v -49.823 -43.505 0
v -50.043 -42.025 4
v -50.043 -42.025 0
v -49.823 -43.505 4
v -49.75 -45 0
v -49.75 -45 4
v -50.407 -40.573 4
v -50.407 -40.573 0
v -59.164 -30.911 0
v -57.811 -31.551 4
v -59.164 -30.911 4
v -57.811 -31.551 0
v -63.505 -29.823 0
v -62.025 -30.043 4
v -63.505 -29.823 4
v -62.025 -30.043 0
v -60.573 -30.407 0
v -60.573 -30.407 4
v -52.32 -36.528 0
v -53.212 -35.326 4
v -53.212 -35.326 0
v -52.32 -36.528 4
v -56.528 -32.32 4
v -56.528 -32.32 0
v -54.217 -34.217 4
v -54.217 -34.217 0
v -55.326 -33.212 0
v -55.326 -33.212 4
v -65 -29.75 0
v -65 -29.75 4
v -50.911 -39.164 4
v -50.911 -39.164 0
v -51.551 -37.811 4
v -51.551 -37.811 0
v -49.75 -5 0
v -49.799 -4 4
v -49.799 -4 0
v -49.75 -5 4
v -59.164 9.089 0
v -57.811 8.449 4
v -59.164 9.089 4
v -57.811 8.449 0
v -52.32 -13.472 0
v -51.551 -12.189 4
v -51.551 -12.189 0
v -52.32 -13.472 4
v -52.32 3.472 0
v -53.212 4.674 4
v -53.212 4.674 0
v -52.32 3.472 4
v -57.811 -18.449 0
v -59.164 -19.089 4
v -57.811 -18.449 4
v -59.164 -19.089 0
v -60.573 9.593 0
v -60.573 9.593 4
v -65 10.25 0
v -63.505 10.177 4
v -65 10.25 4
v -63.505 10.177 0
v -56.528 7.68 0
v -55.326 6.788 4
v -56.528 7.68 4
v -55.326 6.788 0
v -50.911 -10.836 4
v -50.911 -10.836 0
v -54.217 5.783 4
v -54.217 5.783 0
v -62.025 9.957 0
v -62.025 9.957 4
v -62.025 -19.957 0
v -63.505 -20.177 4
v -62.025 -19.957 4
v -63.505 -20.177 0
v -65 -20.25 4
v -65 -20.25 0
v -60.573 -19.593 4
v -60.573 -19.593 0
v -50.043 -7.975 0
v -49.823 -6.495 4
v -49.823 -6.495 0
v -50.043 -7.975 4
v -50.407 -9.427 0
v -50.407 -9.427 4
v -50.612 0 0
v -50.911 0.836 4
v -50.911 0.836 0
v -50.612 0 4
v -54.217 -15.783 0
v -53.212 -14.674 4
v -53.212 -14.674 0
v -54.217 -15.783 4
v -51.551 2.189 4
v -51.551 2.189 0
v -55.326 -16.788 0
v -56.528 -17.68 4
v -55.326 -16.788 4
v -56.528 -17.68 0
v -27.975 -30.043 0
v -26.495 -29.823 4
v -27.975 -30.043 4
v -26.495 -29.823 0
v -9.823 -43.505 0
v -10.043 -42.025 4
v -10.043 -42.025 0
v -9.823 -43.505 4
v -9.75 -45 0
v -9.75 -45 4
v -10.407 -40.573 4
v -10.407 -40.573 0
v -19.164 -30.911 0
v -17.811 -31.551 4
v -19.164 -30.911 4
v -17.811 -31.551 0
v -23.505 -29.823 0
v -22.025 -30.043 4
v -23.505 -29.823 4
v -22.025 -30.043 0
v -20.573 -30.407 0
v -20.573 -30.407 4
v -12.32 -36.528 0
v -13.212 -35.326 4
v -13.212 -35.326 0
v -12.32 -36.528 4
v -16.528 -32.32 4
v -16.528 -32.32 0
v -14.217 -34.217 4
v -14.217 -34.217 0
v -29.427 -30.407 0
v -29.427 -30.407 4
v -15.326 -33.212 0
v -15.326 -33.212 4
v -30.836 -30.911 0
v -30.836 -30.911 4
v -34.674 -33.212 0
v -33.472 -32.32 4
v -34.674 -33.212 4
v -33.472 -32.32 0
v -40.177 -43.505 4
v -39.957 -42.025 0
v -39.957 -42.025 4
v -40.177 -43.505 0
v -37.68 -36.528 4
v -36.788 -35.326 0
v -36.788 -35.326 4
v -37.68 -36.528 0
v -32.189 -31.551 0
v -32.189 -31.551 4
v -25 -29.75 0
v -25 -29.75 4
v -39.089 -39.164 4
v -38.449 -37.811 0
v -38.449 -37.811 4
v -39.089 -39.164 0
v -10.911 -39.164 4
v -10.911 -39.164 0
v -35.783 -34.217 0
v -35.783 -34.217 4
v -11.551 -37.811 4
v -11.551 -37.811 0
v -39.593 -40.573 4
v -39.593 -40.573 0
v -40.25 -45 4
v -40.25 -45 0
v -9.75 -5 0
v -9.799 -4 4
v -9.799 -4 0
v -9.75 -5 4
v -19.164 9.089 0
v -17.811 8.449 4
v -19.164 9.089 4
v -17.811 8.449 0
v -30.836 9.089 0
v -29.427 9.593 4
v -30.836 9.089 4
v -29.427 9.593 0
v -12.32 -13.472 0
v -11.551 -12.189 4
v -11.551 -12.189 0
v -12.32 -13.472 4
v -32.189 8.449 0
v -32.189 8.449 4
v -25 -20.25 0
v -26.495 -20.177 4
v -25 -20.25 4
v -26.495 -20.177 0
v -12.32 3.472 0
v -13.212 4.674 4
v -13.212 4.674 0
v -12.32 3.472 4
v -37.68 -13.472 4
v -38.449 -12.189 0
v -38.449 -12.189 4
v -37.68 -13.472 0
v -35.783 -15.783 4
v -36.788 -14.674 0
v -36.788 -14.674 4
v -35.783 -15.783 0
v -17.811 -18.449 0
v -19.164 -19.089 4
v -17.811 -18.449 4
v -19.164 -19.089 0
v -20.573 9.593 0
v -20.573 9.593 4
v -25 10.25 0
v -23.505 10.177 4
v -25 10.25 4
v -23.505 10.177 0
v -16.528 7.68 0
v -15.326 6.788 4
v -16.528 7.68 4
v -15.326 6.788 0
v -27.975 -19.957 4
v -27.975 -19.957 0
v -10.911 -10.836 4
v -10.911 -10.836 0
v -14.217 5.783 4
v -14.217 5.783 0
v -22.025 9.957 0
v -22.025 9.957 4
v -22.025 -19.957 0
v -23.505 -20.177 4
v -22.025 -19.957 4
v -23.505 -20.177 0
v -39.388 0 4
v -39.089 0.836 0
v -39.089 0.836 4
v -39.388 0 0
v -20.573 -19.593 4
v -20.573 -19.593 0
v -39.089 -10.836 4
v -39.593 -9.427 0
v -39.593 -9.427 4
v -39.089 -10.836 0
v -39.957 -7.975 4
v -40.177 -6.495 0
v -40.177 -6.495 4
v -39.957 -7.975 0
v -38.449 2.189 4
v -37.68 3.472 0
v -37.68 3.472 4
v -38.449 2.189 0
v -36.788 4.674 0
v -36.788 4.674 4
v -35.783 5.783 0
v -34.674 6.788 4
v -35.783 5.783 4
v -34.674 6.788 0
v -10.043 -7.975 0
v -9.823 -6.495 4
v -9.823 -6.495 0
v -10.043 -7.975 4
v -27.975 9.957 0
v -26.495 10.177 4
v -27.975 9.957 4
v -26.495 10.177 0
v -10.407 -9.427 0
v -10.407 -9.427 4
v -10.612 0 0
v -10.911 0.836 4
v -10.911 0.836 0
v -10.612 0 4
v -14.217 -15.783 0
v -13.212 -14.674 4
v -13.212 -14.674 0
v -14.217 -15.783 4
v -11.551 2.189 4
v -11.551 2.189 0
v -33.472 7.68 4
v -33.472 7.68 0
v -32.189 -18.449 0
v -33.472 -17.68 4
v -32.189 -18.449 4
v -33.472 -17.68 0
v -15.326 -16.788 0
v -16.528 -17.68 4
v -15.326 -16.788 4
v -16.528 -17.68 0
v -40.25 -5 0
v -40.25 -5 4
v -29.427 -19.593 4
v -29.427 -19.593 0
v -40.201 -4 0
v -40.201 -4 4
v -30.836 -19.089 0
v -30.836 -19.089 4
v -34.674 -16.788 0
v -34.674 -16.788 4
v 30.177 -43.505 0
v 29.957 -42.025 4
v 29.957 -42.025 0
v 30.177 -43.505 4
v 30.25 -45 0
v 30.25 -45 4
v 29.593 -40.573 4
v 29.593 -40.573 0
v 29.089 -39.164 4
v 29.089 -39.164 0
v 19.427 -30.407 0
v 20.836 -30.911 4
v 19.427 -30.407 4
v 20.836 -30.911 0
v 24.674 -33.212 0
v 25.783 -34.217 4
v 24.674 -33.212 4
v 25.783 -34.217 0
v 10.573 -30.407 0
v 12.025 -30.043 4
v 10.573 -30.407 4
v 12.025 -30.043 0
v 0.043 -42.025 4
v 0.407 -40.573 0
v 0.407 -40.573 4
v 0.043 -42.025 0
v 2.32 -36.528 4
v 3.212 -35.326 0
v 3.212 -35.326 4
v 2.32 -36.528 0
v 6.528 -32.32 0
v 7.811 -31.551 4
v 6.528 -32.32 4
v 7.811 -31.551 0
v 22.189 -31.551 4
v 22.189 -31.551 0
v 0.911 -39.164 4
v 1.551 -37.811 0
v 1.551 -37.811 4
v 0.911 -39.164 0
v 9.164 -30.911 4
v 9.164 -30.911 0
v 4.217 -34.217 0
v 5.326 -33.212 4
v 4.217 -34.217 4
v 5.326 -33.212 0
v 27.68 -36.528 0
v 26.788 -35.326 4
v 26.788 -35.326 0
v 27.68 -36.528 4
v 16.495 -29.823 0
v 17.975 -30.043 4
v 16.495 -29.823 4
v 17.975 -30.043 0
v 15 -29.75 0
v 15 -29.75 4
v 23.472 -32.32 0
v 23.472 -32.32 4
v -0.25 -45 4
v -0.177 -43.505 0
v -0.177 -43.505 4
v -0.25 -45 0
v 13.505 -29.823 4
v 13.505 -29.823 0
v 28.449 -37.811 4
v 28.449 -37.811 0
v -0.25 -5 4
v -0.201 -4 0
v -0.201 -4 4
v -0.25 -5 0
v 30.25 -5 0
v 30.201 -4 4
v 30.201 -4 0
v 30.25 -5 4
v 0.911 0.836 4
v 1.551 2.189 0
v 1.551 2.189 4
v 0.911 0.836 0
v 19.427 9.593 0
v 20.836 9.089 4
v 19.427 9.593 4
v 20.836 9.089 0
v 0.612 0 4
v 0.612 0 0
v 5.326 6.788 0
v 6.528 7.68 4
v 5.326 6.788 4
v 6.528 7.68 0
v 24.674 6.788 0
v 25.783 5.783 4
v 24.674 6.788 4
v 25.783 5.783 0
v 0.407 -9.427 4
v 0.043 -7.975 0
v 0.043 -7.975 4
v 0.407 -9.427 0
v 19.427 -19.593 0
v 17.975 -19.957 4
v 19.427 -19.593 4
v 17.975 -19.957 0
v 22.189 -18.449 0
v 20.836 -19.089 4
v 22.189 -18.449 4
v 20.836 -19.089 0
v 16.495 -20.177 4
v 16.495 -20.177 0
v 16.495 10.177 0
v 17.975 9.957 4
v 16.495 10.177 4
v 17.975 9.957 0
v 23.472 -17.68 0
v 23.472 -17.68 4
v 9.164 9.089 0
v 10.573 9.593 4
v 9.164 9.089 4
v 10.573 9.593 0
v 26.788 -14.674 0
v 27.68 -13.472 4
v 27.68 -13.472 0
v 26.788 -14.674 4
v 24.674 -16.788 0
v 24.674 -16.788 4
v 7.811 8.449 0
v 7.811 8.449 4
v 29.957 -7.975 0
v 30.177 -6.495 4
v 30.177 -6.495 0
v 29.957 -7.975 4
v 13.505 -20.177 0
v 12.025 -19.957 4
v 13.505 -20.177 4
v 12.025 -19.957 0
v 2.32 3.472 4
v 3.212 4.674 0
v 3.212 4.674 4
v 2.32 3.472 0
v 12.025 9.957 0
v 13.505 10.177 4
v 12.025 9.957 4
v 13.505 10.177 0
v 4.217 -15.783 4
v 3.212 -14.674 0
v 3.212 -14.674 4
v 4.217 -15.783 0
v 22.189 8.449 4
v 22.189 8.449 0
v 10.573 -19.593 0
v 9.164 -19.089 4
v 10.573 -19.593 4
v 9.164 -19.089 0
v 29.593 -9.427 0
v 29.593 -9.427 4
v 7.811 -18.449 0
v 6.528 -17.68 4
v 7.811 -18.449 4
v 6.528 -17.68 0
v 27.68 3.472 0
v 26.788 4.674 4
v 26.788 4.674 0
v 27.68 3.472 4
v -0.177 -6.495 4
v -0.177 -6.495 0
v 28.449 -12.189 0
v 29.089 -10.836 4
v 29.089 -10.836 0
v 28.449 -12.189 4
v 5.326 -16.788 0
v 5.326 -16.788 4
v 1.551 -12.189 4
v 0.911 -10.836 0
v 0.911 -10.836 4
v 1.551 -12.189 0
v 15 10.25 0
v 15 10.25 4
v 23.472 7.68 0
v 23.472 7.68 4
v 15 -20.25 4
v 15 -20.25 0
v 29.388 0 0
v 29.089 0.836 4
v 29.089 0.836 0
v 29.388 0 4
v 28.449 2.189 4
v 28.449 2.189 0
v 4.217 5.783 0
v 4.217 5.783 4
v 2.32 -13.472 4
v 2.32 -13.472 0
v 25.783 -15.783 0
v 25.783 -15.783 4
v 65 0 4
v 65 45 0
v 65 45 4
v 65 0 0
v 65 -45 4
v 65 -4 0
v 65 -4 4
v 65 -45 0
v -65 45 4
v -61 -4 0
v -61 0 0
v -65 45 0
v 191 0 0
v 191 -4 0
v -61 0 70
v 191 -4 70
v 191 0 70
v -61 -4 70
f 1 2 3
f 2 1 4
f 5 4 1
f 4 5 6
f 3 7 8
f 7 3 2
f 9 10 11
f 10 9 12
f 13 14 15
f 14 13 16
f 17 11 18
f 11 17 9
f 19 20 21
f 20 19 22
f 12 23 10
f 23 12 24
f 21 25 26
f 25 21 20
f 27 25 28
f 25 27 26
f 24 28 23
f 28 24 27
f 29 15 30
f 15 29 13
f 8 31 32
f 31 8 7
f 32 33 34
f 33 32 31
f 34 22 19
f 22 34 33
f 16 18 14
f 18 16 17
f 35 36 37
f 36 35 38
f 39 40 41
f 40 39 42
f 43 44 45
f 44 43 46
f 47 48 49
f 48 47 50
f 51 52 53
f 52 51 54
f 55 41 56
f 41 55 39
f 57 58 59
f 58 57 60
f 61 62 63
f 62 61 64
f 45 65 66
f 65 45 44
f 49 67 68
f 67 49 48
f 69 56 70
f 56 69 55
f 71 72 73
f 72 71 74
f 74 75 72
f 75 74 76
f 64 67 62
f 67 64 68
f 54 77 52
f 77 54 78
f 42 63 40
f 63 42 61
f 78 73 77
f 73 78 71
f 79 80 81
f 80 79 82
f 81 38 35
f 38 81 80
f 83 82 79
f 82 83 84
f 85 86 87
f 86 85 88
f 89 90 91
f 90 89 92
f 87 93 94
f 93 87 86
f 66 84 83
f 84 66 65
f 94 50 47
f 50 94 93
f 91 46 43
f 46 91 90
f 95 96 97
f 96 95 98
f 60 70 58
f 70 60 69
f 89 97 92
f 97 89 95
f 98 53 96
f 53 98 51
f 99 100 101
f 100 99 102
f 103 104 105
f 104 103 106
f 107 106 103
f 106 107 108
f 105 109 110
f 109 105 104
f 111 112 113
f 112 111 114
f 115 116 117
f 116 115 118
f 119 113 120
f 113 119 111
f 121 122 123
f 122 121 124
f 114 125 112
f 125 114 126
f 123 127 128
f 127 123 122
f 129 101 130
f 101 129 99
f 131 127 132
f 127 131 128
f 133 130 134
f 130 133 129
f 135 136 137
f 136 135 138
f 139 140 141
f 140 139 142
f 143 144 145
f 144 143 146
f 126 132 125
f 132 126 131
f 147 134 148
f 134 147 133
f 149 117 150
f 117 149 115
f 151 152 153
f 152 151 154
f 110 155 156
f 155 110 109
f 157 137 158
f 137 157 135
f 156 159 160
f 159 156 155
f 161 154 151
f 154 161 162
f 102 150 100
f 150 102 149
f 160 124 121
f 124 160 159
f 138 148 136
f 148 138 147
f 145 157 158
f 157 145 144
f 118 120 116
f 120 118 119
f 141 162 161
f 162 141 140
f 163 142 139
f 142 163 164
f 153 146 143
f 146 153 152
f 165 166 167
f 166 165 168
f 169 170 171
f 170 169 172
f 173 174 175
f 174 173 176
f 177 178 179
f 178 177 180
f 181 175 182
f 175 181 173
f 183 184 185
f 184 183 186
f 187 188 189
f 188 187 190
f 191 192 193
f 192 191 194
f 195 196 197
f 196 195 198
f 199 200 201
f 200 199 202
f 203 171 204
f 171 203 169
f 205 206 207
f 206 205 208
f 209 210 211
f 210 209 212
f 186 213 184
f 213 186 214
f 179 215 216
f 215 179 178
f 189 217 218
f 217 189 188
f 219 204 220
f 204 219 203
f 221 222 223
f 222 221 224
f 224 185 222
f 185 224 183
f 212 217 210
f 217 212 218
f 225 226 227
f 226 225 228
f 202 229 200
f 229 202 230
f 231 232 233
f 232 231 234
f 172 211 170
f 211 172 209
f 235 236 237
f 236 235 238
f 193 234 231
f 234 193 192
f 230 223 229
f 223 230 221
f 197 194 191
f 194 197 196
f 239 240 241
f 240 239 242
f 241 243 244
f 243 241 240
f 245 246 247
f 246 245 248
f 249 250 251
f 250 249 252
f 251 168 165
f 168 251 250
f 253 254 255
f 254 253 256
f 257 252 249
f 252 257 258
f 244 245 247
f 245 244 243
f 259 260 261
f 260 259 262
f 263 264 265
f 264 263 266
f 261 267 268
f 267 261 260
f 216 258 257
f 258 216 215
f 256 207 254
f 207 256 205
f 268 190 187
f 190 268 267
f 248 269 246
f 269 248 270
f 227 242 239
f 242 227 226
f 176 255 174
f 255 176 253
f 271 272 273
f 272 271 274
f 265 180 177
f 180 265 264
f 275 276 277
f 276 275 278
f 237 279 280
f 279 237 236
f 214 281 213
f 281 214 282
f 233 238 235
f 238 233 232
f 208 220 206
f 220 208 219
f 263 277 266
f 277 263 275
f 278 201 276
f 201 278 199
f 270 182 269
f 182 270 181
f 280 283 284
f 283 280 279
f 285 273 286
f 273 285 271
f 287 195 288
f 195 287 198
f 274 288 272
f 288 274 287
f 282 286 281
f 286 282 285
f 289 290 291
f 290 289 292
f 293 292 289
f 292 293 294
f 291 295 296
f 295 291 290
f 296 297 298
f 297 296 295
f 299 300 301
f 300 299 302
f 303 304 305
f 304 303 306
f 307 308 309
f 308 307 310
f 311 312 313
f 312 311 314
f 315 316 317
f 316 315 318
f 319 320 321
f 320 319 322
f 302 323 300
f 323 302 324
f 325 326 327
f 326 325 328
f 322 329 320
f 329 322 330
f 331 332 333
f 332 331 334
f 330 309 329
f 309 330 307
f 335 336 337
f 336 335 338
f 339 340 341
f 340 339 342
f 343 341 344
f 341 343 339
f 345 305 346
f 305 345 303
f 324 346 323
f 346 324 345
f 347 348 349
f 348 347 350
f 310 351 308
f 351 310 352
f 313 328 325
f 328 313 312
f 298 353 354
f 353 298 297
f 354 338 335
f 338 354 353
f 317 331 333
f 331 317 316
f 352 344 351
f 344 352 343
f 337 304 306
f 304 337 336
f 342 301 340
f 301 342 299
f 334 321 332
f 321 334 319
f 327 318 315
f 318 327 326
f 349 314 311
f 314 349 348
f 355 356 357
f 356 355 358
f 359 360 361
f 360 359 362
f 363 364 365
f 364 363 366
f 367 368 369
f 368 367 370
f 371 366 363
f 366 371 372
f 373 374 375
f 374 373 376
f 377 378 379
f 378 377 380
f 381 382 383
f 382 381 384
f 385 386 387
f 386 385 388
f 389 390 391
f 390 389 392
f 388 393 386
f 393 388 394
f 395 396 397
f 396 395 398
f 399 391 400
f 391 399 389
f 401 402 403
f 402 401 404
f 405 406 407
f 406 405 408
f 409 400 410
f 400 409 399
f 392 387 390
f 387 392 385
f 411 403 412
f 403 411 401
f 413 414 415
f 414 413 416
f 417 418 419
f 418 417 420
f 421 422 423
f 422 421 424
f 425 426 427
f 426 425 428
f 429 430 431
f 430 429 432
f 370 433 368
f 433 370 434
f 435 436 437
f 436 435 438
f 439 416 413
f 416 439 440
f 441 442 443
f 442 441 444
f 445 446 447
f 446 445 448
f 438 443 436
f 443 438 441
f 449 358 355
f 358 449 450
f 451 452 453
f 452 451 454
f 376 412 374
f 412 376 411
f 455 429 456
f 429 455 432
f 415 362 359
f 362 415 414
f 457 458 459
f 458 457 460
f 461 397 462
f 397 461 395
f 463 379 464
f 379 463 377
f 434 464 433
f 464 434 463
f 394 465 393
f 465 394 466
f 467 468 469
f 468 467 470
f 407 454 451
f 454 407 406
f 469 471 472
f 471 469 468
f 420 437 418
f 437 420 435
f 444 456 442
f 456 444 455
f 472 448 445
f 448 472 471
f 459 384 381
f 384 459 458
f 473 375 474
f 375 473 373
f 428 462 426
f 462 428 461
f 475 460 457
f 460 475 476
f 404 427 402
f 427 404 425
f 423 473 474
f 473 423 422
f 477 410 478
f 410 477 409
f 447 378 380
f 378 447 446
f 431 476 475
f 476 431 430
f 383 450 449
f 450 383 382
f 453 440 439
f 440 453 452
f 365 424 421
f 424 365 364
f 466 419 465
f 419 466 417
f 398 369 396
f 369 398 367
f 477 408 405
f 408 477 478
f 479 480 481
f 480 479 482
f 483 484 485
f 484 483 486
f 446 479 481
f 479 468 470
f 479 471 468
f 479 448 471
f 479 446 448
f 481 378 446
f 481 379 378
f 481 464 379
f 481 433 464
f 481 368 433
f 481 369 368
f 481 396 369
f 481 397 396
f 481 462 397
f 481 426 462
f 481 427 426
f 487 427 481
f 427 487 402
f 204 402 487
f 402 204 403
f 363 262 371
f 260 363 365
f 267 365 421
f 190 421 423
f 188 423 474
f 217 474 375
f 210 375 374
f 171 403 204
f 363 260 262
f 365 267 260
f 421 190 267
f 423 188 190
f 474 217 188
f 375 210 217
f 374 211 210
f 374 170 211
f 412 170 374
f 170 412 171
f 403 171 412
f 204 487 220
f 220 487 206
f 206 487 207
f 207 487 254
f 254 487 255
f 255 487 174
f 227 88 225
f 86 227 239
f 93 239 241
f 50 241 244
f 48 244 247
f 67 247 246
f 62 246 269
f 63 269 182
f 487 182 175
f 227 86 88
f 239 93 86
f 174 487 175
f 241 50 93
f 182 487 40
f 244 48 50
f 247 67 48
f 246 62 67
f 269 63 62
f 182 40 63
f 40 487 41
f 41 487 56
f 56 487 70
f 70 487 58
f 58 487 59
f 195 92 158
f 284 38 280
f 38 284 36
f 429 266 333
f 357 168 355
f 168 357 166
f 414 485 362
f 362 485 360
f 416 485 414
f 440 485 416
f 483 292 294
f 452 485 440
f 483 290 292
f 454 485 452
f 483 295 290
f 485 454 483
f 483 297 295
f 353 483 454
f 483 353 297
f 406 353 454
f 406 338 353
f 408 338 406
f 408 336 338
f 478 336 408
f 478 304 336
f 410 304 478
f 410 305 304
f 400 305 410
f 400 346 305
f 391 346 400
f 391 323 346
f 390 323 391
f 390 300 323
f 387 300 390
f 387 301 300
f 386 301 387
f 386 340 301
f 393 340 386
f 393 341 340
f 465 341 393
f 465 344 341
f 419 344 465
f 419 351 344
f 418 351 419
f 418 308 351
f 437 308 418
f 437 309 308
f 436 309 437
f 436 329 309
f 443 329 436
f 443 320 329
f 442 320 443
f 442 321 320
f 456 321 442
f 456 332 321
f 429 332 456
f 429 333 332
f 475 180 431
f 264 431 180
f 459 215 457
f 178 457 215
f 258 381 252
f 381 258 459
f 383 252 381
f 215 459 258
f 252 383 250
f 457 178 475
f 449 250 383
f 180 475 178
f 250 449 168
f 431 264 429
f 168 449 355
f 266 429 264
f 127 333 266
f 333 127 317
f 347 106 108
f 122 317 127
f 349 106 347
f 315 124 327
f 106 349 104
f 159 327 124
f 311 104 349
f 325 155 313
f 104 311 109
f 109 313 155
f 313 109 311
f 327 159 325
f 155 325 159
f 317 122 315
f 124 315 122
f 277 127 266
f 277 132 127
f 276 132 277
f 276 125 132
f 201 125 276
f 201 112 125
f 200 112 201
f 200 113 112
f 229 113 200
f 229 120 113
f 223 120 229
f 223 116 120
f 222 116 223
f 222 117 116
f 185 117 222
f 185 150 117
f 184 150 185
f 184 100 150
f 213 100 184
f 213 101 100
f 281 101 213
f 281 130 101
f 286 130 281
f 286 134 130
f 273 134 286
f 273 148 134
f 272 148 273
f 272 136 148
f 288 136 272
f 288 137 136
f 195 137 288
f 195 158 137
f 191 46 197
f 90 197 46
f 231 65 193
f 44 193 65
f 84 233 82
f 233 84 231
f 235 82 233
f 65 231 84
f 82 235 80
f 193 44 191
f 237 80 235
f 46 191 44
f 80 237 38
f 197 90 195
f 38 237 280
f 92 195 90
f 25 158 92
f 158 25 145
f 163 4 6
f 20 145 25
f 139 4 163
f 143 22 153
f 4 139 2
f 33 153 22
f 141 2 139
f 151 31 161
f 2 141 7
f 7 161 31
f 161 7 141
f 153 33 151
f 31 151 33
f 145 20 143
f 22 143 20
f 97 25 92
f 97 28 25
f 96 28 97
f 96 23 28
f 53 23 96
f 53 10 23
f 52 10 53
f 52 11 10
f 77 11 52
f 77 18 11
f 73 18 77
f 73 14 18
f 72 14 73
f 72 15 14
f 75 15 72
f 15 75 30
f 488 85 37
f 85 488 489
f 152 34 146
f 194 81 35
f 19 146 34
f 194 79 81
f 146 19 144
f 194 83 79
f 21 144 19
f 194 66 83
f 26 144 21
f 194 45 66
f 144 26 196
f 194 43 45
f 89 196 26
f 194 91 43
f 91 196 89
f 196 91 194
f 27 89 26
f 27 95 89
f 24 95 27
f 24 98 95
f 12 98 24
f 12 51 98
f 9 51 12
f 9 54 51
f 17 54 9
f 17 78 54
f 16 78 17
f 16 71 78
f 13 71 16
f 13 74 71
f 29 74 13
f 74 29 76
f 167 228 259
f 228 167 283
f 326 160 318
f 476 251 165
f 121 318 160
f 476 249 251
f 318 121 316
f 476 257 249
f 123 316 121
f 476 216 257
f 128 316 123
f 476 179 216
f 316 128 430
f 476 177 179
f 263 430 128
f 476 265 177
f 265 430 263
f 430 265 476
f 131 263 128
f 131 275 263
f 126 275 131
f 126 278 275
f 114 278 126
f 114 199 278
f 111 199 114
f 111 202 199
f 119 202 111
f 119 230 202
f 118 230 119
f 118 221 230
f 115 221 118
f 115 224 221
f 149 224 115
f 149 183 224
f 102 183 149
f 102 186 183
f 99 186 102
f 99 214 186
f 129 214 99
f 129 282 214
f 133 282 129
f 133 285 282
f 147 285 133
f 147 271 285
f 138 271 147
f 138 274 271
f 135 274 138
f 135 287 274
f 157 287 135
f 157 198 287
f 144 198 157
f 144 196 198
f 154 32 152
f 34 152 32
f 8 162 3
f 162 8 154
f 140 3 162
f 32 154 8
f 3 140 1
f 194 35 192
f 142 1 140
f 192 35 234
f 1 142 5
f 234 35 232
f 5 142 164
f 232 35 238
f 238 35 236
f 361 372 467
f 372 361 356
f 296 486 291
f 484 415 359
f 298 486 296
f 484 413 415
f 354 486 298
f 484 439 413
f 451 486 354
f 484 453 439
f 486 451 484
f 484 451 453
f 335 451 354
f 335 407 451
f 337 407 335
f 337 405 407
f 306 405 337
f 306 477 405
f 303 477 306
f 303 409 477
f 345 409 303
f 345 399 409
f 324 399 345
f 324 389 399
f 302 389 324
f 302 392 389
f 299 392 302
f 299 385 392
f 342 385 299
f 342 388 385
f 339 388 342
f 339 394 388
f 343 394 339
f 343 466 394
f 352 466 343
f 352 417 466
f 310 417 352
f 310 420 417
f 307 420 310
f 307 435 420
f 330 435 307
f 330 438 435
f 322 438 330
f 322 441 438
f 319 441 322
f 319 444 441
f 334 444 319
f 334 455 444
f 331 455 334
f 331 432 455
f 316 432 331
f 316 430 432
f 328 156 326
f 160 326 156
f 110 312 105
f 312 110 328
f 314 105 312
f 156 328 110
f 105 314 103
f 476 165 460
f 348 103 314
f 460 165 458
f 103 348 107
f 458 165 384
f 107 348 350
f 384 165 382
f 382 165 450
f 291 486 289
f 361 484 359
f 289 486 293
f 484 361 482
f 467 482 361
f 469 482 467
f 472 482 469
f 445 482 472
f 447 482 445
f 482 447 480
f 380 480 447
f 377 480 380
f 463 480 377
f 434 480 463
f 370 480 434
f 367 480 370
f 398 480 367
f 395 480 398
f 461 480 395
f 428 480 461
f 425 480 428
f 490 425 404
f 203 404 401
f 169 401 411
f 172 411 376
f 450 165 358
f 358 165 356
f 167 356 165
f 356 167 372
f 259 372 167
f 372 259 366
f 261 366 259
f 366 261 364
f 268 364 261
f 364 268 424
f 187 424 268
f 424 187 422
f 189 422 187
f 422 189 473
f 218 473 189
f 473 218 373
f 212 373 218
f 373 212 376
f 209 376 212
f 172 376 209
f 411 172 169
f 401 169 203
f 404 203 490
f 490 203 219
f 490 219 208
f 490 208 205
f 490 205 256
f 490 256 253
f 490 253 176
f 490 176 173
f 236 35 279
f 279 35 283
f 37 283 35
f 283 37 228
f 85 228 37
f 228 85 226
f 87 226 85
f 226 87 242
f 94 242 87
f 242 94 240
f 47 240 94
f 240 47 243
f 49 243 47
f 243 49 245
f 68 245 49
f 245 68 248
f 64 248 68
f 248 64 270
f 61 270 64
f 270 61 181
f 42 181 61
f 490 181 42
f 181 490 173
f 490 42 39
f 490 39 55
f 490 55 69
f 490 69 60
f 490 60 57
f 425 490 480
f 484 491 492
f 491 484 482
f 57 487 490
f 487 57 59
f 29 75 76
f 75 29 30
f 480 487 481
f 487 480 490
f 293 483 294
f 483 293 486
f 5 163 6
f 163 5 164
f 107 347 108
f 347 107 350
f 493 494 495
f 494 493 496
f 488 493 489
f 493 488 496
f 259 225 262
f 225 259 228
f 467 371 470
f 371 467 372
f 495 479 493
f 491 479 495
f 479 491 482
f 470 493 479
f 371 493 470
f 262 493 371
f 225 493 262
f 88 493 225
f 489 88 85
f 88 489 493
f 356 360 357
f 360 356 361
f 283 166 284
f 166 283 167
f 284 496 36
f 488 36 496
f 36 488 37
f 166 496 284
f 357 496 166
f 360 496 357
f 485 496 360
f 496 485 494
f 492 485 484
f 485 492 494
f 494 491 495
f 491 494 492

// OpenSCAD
// Rack for six 50 mL conical (Falcon-type) tubes
// Print orientation: flat plate on bed, walls rising to z = 70.
// After printing, flip the part so the walls stand on the bed and the
// tube holes face upward.
//
// Units: mm. $fn = 64 on curved shapes. No external libraries.

// ---------------- Parameters ----------------
plate_x      = 130;   // plate length along X
plate_y      = 90;    // plate width along Y
plate_t      = 4;     // plate thickness (z = 0 to 4)

hole_d       = 30.5;  // through-hole diameter (Falcon tube clearance)
hole_nx      = 3;     // holes per row along X
hole_ny      = 2;     // rows along Y
hole_pitch   = 40;    // centre-to-centre spacing, both directions

wall_t       = 4;     // wall thickness (Y)
wall_h       = 70;    // wall top height (z)
wall_nx      = 2;     // number of wall segments (two long edges)

eps          = 0.5;   // cutter overshoot past faces
$fn          = 64;    // circle resolution

// Derived
wall_x0 = -plate_x / 2 + wall_t;   // inner X of right wall
wall_x1 = plate_x / 2 - wall_t;    // inner X of left wall

// ---------------- Model ----------------
union() {
    // Base plate with hole grid
    difference() {
        translate([-plate_x / 2, -plate_y / 2, 0])
            cube([plate_x, plate_y, plate_t]);

        for (i = [0 : hole_nx - 1])
            for (j = [0 : hole_ny - 1])
                translate([
                    -plate_x / 2 + i * hole_pitch,
                    -plate_y / 2 + j * hole_pitch,
                    -eps
                ])
                    cylinder(d = hole_d, h = plate_t + 2 * eps);
    }

    // Two solid walls along the long edges, flush with the plate
    for (k = [0 : wall_nx - 1]) {
        translate([wall_x0 + k * (plate_x / 2 - wall_x0), -wall_t, 0])
            cube([plate_x / 2 - wall_x0, wall_t, wall_h]);   // left edge
        translate([wall_x1 + k * (plate_x / 2 - wall_x1), -wall_t, 0])
            cube([plate_x / 2 - wall_x1, wall_t, wall_h]);   // right edge
    }
}
